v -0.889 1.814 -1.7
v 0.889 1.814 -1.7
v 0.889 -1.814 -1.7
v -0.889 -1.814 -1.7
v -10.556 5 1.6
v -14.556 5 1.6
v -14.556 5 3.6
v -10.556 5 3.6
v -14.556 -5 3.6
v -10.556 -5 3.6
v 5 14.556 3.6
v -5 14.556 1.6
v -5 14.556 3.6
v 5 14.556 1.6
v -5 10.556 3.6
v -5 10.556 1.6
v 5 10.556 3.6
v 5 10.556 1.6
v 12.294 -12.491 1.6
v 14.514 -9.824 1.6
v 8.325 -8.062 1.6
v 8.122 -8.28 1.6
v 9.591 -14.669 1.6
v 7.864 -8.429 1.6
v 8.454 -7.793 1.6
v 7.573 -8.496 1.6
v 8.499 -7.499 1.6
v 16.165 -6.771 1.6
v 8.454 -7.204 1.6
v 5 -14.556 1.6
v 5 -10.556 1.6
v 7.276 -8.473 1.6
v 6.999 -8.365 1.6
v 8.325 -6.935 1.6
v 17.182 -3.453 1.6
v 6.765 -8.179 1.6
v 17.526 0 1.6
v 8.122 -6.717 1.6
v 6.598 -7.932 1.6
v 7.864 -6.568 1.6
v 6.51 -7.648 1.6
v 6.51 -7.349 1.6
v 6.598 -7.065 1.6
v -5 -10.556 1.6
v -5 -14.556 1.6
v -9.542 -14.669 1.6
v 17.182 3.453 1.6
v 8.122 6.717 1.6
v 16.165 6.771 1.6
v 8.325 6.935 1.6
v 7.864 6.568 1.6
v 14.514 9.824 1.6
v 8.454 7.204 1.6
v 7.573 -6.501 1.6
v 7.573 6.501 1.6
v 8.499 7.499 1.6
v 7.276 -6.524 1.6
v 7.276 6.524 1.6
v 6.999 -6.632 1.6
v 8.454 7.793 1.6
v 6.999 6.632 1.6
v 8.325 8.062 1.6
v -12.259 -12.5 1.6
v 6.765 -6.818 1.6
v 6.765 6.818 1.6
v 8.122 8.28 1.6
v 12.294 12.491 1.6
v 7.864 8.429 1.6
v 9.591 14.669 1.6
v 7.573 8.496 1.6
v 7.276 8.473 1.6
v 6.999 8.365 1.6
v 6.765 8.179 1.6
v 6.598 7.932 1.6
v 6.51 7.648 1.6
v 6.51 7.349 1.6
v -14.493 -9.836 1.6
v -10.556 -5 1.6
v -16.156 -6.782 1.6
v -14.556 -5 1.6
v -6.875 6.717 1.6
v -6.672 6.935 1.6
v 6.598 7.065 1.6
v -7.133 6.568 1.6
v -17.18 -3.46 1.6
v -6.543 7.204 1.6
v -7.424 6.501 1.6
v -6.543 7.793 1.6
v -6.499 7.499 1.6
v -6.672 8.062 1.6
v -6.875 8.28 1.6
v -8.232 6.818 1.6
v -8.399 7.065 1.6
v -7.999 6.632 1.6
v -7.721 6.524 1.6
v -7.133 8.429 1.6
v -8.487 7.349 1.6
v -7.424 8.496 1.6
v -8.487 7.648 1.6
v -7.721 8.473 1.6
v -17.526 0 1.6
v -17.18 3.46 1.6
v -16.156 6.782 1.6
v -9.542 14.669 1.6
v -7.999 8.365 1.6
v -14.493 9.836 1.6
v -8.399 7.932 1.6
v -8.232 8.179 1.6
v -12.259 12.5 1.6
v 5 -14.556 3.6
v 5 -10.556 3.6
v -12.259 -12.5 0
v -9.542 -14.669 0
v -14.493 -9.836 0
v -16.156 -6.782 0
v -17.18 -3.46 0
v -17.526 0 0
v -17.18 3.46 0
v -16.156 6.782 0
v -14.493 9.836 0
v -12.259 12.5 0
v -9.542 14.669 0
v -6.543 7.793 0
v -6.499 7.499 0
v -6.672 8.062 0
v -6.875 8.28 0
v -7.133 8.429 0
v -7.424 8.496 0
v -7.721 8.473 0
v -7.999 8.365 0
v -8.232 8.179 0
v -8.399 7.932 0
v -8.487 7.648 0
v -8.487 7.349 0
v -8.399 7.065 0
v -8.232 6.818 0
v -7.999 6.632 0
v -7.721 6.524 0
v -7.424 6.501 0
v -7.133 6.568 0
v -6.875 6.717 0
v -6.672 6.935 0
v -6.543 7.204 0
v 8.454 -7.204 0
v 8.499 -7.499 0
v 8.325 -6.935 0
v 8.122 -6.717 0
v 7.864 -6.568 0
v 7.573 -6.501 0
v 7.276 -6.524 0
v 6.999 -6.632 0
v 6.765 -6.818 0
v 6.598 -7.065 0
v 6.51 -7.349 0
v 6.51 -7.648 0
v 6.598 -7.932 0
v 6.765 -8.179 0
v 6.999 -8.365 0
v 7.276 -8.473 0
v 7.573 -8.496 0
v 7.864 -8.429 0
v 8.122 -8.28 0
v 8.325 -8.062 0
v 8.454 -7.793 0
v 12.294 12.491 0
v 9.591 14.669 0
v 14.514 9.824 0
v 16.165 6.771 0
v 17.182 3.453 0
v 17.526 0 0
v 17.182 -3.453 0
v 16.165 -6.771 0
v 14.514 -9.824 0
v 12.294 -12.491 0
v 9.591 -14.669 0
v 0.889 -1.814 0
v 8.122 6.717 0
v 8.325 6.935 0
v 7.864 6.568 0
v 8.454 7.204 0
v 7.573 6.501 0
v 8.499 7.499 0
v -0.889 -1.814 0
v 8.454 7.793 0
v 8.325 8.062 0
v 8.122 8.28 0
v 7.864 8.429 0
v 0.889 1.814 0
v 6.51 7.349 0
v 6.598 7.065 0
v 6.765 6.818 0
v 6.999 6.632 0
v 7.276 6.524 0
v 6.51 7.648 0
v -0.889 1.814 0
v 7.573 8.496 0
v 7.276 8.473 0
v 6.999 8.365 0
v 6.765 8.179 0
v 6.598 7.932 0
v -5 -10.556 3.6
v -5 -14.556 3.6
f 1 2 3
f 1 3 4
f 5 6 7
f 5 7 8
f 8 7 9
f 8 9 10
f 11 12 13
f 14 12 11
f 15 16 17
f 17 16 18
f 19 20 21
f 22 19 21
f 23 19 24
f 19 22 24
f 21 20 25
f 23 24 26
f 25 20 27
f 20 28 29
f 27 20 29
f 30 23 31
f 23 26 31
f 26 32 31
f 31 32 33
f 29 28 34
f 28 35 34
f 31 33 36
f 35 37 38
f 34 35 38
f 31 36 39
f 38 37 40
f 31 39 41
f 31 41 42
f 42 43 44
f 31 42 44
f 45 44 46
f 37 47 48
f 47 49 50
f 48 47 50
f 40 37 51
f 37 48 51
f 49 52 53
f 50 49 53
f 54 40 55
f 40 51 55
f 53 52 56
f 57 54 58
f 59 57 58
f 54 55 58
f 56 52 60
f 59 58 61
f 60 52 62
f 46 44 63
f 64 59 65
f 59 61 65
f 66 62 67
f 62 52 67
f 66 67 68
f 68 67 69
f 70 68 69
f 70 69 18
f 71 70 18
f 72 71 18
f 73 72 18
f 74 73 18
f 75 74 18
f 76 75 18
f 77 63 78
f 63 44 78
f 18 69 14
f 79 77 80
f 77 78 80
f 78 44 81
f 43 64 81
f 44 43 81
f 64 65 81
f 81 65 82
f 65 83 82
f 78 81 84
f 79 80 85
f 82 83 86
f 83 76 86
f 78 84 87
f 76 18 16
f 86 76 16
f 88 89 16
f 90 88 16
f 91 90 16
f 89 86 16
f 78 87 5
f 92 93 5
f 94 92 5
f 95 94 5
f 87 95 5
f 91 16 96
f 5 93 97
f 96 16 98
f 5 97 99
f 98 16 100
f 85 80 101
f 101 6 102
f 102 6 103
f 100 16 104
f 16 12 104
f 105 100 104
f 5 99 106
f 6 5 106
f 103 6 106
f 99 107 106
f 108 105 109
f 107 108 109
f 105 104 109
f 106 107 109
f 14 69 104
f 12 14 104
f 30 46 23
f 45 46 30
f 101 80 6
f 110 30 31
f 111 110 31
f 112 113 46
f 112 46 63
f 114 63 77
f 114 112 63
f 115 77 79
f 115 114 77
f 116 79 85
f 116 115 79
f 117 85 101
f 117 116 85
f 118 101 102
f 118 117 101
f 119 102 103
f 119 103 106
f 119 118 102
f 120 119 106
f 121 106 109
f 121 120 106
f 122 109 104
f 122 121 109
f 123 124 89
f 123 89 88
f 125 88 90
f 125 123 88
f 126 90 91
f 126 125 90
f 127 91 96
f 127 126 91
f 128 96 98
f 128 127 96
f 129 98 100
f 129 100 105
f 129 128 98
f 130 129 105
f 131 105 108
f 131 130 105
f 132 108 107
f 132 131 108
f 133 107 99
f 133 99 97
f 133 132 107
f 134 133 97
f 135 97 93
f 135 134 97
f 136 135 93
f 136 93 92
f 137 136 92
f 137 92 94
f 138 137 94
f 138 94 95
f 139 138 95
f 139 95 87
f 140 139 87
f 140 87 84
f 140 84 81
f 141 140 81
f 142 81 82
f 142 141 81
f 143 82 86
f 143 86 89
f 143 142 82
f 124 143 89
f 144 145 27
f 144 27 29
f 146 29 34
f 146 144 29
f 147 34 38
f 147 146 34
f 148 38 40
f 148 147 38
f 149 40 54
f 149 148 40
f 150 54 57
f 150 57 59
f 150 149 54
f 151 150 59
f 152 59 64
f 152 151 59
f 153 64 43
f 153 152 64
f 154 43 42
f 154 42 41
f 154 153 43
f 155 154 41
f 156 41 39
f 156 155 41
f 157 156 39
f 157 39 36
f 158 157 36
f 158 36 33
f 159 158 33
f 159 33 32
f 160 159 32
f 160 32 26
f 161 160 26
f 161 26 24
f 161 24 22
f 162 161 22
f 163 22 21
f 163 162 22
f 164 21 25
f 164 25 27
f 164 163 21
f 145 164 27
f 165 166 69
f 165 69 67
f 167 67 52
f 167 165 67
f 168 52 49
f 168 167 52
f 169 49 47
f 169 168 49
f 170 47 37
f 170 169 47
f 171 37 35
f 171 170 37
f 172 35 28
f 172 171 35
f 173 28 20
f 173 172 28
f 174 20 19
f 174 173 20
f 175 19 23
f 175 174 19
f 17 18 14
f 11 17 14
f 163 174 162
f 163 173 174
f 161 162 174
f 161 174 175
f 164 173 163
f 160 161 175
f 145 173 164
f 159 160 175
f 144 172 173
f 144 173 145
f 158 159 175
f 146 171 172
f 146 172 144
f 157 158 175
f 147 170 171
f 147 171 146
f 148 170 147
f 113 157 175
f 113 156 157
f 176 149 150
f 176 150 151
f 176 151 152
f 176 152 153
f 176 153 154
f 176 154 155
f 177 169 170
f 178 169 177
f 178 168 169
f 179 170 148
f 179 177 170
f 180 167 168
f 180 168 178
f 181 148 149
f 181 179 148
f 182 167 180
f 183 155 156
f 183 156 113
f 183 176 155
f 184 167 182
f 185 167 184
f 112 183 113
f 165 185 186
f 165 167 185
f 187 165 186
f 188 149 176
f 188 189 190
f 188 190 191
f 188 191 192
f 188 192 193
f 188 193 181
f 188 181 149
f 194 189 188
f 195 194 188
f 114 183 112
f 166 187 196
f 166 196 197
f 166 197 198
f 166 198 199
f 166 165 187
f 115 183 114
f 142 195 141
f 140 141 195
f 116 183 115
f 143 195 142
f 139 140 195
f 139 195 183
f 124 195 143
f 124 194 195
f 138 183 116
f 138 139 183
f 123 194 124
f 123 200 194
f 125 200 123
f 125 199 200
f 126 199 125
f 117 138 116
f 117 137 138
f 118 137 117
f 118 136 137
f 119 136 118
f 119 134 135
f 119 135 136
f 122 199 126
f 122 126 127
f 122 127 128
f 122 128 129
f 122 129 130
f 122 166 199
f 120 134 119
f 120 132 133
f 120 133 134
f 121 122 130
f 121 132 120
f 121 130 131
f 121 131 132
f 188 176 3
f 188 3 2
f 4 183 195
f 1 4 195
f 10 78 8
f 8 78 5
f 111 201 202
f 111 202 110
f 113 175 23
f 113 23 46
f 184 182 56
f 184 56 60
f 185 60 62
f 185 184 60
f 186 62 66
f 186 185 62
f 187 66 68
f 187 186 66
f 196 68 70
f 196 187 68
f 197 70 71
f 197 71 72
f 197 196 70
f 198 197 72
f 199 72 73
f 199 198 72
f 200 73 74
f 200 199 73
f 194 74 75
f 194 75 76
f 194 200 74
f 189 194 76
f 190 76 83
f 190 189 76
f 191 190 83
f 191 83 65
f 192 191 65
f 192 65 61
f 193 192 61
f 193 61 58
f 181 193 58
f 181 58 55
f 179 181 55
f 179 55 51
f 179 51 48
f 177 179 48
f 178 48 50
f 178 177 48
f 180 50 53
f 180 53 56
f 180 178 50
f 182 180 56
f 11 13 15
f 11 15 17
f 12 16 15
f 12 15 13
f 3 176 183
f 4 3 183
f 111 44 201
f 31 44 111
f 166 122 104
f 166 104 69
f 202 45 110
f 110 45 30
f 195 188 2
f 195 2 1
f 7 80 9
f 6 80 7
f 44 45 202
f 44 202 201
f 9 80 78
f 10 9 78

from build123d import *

# Parameters (mm, degrees)
SKETCH_1_R      = 1
EXTRUDE_1_DEPTH = 1.6
SKETCH_2_W      = 1.777379574
SKETCH_2_H      = 3.627987188
EXTRUDE_2_DEPTH = 1.7
SKETCH_3_W      = 4
SKETCH_3_H      = 10
SKETCH_3_W_2    = 10
SKETCH_3_H_2    = 4
EXTRUDE_3_DEPTH = 2


with BuildPart() as part:
    # 草图1 → 凸台-拉伸1 (new body)
    with BuildSketch(Plane.XY):
        with BuildLine():
            Line((-9.541571686, 14.6685), (9.591443257, 14.6685))
            ThreePointArc((9.591443257, 14.6685), (17.526, 0), (9.591443257, -14.6685))
            Line((9.591443257, -14.6685), (-9.541571686, -14.6685))
            ThreePointArc((-9.541571686, -14.6685), (-17.526, 0), (-9.541571686, 14.6685))
        make_face()
        with Locations((7.498513861, -7.498513861)):
            Circle(SKETCH_1_R, mode=Mode.SUBTRACT)
        with Locations((-7.498513861, 7.498513861)):
            Circle(SKETCH_1_R, mode=Mode.SUBTRACT)
        with Locations((7.498513861, 7.498513861)):
            Circle(SKETCH_1_R, mode=Mode.SUBTRACT)
    extrude(amount=EXTRUDE_1_DEPTH)

    # 草图2 → 凸台-拉伸2 (add)
    with BuildSketch(Plane(origin=(0, 0, 0), x_dir=(-1, 0, 0), z_dir=(0, 0, -1))):
        Rectangle(SKETCH_2_W, SKETCH_2_H)
    extrude(amount=EXTRUDE_2_DEPTH)

    # 草图3 → 凸台-拉伸3 (add)
    with BuildSketch(Plane.XY.offset(1.6)):
        with Locations((-12.555549106, 0)):
            Rectangle(SKETCH_3_W, SKETCH_3_H)
        with Locations((0, -12.555549106)):
            Rectangle(SKETCH_3_W_2, SKETCH_3_H_2)
        with Locations((0, 12.555549106)):
            Rectangle(SKETCH_3_W_2, SKETCH_3_H_2)
    extrude(amount=EXTRUDE_3_DEPTH)


solid = part.part
